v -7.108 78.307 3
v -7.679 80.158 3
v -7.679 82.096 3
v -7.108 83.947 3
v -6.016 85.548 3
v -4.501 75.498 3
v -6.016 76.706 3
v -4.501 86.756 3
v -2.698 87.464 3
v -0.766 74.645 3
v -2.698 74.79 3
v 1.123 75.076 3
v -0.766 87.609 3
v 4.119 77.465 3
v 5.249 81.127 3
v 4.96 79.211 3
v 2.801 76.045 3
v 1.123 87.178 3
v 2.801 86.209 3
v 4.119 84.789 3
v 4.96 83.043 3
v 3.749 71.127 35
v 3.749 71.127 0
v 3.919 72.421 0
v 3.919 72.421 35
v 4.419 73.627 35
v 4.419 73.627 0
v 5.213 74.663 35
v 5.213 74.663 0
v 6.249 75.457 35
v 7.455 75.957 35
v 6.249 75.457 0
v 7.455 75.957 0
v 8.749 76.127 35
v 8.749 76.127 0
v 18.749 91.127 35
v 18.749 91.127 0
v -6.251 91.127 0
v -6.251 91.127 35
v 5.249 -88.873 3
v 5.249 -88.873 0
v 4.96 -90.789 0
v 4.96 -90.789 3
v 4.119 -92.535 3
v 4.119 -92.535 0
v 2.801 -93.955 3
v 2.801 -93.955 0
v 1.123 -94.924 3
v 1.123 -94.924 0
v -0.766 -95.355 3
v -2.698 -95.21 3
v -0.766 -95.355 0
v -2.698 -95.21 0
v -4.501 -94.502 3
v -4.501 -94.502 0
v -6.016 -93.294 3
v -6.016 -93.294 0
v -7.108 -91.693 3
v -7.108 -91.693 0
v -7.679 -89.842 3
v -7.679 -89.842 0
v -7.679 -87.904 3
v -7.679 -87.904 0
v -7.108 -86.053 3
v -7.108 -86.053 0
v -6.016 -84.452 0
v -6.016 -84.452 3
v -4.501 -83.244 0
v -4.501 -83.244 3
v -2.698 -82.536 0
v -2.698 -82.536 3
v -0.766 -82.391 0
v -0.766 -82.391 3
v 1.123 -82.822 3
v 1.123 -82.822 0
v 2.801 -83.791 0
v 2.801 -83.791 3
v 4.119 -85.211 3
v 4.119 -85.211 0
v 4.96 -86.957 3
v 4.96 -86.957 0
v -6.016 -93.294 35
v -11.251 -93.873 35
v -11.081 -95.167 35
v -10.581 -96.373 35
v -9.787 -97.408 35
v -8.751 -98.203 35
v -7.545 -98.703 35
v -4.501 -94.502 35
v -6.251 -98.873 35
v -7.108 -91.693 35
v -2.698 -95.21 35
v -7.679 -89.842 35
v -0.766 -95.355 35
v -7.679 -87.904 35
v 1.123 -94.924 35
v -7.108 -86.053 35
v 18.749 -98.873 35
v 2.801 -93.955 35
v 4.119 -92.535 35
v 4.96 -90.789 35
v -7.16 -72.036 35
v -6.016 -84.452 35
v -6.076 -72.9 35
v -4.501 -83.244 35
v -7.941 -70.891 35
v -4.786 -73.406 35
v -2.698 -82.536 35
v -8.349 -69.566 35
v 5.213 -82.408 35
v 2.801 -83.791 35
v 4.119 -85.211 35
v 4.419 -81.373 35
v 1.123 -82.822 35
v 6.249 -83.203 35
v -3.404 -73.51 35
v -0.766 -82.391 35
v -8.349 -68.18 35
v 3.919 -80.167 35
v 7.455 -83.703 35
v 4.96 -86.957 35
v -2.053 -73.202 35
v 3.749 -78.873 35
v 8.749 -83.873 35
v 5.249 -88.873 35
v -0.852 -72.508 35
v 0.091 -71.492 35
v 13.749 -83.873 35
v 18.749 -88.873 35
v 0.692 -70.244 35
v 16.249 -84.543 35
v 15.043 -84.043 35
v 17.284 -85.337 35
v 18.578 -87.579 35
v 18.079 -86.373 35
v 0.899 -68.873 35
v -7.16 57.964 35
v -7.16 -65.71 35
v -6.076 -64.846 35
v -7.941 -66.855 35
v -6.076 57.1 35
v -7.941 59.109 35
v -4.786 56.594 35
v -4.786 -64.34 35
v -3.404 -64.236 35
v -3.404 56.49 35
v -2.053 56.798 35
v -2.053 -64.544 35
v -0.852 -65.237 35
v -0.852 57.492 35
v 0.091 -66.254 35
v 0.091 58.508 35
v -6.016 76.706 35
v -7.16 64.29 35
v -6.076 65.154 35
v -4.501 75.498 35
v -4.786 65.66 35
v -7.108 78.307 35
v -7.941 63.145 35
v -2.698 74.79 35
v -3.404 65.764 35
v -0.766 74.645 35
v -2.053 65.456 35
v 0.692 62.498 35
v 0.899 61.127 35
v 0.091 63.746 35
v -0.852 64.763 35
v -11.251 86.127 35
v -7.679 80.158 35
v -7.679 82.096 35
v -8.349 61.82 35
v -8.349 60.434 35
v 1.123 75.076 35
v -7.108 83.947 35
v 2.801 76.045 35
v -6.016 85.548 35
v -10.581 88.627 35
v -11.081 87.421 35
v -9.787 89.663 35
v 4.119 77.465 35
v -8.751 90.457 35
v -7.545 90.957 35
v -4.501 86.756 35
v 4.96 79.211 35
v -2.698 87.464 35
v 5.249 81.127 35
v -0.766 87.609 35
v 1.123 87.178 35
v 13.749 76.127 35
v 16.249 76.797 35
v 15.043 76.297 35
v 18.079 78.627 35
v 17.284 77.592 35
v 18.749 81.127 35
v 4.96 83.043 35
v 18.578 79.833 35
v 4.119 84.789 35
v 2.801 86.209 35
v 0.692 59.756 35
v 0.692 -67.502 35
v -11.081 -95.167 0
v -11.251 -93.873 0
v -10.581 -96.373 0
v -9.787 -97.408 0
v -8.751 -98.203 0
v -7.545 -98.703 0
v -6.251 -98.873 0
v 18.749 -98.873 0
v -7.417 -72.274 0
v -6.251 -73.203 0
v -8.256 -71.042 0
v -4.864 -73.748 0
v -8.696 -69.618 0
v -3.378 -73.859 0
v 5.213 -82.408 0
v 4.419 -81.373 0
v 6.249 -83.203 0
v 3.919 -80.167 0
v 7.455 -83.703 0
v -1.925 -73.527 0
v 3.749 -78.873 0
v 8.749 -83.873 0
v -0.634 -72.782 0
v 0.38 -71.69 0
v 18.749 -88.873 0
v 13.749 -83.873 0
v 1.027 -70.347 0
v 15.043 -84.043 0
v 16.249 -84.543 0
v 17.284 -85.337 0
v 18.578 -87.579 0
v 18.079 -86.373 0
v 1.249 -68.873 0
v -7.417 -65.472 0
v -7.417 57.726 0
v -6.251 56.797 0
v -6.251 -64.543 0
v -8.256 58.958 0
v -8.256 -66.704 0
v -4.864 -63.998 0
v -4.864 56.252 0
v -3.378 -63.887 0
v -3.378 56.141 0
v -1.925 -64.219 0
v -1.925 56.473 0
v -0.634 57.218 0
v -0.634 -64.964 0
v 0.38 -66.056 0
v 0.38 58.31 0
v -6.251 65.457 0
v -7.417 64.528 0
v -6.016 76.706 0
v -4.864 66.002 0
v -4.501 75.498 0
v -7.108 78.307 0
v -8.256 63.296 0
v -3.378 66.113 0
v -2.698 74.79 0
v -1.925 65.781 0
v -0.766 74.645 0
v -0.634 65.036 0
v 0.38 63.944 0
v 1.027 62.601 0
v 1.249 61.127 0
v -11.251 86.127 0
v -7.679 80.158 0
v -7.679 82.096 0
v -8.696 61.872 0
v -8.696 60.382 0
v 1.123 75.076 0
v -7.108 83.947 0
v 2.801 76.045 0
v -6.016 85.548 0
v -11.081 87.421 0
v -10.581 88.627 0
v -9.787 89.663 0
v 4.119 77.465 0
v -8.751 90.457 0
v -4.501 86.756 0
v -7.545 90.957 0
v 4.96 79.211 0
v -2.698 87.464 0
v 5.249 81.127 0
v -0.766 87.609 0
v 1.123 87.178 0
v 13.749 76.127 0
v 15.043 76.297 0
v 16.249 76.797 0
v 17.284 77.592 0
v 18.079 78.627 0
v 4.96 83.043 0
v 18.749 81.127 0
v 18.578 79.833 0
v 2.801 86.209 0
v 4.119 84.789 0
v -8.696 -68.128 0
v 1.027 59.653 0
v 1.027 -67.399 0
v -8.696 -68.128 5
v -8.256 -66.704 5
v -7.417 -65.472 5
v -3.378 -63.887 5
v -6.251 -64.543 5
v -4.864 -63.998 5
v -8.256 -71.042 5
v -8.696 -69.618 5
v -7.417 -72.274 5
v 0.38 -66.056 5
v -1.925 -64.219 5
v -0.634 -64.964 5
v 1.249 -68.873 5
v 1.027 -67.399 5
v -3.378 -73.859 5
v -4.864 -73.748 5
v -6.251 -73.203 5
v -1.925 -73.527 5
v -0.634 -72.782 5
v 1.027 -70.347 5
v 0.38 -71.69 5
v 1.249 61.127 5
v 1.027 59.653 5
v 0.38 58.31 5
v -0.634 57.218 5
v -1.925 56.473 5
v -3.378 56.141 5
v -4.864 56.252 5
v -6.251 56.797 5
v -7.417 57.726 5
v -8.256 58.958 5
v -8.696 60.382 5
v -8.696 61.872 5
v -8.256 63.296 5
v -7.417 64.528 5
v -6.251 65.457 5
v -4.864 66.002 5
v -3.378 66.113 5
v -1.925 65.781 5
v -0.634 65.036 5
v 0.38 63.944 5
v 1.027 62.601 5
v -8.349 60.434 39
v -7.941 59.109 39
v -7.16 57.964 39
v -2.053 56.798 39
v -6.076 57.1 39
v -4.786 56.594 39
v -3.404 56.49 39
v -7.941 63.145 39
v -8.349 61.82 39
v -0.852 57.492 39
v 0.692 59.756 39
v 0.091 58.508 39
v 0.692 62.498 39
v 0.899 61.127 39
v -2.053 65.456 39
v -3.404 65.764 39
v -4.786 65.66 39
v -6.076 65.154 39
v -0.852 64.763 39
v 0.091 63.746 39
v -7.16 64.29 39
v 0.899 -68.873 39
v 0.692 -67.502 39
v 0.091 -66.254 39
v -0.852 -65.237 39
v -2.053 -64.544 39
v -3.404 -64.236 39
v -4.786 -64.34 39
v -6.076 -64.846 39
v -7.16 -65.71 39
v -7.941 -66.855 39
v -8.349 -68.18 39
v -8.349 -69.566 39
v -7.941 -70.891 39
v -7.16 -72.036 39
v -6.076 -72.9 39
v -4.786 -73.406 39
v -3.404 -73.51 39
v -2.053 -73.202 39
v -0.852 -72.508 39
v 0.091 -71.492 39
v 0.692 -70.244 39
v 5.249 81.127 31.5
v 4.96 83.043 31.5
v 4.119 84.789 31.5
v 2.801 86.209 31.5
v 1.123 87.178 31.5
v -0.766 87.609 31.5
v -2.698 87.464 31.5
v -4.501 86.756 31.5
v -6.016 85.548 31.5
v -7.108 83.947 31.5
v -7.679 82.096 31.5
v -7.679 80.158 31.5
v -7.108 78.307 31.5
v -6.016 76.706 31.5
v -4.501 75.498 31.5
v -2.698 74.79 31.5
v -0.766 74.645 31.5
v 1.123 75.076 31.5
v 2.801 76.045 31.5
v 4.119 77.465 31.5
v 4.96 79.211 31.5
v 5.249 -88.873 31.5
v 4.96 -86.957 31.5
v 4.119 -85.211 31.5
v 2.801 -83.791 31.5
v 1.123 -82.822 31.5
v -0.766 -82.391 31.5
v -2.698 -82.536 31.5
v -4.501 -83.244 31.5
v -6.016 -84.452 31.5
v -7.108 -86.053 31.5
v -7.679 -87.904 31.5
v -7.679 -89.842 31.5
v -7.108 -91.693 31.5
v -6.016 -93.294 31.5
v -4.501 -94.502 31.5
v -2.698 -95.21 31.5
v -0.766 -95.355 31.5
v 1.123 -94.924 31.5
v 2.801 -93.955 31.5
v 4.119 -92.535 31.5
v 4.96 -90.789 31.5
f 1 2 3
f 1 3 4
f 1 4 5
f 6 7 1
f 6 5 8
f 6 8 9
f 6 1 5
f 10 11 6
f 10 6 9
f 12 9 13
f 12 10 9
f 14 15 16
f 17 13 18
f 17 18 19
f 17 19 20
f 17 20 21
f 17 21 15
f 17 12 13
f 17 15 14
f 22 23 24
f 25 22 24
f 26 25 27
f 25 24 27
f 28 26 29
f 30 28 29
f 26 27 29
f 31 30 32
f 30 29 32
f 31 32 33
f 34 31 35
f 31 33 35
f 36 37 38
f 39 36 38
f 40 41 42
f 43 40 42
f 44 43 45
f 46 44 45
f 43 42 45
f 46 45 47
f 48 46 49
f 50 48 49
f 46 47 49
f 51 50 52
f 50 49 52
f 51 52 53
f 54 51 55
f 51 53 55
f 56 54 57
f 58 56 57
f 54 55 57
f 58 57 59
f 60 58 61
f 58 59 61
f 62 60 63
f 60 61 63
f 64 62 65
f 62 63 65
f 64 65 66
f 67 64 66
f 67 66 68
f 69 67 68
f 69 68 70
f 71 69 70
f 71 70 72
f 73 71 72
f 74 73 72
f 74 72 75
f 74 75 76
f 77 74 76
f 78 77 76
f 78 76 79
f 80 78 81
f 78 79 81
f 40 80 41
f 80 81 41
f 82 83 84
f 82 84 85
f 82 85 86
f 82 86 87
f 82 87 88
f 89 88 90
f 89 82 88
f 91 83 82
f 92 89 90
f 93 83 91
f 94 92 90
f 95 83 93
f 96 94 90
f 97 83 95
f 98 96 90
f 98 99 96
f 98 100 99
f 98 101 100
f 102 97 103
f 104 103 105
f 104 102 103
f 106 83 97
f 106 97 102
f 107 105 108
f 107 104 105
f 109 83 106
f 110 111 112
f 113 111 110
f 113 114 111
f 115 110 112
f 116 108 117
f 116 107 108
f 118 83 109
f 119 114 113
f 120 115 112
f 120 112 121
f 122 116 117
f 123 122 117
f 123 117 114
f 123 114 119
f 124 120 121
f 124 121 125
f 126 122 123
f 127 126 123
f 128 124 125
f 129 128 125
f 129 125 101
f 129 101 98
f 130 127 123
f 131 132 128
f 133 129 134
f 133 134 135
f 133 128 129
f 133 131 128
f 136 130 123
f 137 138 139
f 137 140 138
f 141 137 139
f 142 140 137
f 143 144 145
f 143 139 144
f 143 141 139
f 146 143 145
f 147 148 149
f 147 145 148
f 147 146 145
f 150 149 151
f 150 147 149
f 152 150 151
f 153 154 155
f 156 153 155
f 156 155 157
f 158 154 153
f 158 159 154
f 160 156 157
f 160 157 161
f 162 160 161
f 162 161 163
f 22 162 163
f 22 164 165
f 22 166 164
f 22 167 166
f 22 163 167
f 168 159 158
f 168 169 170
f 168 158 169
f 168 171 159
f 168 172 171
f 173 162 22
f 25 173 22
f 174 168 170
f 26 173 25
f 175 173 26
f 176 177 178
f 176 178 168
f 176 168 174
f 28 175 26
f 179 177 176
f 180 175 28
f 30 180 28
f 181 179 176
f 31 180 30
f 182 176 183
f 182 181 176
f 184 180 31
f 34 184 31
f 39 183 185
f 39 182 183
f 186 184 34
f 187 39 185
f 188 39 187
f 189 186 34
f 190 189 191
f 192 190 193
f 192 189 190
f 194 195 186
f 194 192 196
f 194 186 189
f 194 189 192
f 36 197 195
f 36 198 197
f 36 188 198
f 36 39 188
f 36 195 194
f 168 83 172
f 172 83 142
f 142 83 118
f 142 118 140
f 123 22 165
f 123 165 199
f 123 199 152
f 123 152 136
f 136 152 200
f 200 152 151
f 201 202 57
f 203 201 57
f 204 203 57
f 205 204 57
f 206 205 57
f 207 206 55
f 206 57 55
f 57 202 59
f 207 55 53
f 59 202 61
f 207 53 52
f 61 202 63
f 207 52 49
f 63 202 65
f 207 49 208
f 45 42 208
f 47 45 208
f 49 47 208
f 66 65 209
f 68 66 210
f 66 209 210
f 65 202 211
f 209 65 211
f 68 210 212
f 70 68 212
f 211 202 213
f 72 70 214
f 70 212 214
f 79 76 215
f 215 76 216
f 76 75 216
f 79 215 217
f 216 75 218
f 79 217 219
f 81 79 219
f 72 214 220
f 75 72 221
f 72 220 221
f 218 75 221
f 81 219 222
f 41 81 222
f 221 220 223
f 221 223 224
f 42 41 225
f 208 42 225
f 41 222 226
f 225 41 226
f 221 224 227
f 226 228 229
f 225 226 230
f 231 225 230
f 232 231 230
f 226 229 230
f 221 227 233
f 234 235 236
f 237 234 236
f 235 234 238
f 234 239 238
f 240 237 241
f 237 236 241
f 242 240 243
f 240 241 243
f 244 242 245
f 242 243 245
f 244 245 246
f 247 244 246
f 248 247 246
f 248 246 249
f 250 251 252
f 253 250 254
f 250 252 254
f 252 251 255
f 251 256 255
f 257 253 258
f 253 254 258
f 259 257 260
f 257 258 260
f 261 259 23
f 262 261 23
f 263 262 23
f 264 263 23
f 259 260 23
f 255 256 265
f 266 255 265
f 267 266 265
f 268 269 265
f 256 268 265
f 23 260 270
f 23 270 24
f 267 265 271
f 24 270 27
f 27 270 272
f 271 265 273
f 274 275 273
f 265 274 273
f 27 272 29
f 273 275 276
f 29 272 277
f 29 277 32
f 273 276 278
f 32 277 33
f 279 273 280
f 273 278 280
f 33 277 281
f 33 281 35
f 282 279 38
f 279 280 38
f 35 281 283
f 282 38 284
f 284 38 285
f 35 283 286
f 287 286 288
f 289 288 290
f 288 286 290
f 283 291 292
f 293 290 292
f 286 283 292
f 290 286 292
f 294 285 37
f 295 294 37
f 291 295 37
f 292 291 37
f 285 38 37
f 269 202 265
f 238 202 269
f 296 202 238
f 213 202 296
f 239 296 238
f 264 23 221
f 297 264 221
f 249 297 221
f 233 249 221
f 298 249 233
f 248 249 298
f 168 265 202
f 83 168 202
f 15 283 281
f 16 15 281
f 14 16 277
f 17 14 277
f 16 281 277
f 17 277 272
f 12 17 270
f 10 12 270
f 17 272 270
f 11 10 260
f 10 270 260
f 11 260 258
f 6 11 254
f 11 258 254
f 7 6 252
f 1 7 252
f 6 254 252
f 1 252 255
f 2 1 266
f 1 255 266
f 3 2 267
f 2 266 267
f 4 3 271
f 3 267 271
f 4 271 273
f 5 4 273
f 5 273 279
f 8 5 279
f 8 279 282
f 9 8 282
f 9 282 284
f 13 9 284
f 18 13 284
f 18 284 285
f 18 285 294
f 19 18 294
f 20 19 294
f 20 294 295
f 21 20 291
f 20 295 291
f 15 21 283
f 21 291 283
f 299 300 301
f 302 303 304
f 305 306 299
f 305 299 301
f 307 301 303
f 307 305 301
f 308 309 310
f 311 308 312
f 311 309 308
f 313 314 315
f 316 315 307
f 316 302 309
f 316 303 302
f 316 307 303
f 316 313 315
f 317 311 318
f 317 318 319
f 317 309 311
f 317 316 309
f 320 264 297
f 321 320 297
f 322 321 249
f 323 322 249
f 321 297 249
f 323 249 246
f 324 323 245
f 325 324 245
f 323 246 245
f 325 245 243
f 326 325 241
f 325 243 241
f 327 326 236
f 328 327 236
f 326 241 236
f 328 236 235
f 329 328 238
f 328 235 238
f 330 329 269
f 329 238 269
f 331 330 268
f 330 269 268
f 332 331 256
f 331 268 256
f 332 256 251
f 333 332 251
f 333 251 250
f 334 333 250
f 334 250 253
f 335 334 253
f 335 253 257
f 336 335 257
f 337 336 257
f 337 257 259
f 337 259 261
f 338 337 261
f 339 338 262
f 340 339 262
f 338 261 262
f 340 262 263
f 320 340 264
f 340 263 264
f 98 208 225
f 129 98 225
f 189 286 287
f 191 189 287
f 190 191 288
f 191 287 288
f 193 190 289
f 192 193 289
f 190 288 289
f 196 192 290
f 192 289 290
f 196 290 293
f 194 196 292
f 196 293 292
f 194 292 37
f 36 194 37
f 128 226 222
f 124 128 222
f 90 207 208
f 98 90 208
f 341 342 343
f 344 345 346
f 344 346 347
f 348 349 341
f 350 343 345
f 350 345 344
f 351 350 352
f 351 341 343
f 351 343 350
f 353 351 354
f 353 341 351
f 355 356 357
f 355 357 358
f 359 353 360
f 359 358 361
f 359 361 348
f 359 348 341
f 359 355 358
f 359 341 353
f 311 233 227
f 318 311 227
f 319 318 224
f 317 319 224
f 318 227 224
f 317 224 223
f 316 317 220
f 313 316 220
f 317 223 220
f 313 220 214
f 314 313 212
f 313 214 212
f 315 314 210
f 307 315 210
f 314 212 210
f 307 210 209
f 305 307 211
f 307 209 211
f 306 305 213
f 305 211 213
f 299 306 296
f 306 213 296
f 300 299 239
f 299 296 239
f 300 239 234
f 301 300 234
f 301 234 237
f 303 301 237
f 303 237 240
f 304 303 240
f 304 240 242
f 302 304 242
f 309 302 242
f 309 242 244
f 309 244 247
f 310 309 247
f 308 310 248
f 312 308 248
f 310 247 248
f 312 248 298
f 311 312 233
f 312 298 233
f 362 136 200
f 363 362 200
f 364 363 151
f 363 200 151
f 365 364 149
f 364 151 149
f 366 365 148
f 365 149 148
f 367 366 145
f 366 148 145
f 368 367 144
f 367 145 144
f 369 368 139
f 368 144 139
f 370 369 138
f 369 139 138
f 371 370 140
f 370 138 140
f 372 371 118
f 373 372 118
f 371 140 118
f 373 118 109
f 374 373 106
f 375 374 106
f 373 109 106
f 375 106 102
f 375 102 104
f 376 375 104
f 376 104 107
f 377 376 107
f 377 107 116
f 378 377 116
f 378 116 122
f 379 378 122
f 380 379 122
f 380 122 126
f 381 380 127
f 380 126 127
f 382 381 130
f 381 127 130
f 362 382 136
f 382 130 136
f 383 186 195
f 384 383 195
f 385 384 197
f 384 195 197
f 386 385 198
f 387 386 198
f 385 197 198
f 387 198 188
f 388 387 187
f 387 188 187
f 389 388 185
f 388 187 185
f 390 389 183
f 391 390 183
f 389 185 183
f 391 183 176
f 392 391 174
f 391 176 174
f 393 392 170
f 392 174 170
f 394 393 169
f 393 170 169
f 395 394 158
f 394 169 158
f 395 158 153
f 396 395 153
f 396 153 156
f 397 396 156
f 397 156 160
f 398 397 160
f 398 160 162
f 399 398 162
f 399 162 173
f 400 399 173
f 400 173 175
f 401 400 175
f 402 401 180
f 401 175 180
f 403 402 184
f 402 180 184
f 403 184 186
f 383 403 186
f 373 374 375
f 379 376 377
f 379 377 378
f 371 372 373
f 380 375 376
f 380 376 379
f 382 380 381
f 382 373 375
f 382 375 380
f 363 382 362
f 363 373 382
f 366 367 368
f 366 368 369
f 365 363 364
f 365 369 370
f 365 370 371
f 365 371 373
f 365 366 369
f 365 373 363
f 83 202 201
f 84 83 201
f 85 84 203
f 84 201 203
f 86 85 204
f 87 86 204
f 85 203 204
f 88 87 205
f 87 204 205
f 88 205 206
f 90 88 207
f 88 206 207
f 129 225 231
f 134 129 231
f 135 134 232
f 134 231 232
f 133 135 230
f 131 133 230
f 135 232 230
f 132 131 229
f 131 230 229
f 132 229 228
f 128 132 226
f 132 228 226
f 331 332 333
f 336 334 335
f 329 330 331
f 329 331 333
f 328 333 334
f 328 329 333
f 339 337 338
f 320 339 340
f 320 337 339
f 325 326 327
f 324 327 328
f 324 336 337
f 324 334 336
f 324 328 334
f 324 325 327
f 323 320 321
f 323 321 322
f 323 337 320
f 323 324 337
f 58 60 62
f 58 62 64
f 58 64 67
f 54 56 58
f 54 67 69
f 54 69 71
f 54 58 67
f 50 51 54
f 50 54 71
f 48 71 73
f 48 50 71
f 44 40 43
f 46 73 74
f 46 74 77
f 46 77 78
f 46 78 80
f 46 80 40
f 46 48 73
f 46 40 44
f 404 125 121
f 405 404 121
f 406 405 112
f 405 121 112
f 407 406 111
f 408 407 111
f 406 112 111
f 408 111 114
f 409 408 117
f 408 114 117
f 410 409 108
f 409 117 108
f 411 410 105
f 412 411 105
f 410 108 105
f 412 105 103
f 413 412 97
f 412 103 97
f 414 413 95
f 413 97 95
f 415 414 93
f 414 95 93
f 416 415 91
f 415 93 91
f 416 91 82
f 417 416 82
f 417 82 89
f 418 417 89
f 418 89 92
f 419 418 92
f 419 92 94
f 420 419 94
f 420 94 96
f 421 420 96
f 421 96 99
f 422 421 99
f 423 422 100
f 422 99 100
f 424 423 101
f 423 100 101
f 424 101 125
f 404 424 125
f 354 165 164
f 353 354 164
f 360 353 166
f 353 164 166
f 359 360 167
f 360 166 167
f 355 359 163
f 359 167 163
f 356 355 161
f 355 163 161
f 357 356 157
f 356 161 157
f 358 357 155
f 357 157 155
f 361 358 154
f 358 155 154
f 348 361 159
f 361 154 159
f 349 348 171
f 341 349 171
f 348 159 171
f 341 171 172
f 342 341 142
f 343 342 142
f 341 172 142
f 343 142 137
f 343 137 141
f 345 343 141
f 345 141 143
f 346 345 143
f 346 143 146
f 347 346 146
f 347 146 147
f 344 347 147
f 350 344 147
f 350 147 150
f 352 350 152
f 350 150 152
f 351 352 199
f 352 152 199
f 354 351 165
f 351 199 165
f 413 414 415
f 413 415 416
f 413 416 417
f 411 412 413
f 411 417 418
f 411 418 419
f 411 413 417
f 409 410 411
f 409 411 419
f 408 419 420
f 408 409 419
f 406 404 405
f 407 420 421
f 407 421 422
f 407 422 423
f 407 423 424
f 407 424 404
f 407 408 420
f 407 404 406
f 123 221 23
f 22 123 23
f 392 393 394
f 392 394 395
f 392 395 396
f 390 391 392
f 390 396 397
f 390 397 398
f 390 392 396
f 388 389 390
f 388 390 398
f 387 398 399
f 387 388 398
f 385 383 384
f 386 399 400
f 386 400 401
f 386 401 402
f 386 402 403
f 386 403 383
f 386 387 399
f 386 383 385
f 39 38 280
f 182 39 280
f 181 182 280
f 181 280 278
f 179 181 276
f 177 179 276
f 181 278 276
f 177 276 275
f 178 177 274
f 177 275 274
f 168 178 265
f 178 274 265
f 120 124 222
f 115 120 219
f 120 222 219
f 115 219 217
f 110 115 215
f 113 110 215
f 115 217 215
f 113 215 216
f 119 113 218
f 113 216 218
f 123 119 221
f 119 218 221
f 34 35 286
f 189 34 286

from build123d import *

# Parameters (mm, degrees)
F1_DEPTH = 35
F2_R     = 6.5
F4_DEPTH = 3.5
F2_R_2   = 4.65
F5_DEPTH = 4
F3_R     = 6.5
F6_DEPTH = 3
F3_R_2   = 5
F7_DEPTH = 5


with BuildPart() as f1:
    # F0 (on Top) → F1 (new body)
    with BuildSketch(Plane.XY):
        with BuildLine():
            Line((18.748637, 81.127049), (18.748637, 91.127049))
            Line((18.748637, 91.127049), (-6.251363, 91.127049))
            ThreePointArc((-6.251363, 91.127049), (-9.786897, 89.662583), (-11.251363, 86.127049))
            Line((-11.251363, 86.127049), (-11.251363, -93.872951))
            ThreePointArc((-11.251363, -93.872951), (-9.786897, -97.408485), (-6.251363, -98.872951))
            Line((-6.251363, -98.872951), (18.748637, -98.872951))
            Line((18.748637, -98.872951), (18.748637, -88.872951))
            ThreePointArc((18.748637, -88.872951), (17.284171, -85.337417), (13.748637, -83.872951))
            Line((13.748637, -83.872951), (8.748637, -83.872951))
            ThreePointArc((8.748637, -83.872951), (5.213103, -82.408485), (3.748637, -78.872951))
            Line((3.748637, -78.872951), (3.748637, 71.127049))
            ThreePointArc((3.748637, 71.127049), (5.213103, 74.662583), (8.748637, 76.127049))
            Line((8.748637, 76.127049), (13.748637, 76.127049))
            ThreePointArc((13.748637, 76.127049), (17.284171, 77.591515), (18.748637, 81.127049))
        make_face()
    extrude(amount=F1_DEPTH)

    # F2 (on face) → F4 (cut)
    with BuildSketch(Plane.XY.offset(35)):
        with Locations((-1.251363, 81.127049)):
            Circle(F2_R)
        with Locations((-1.251363, -88.872951)):
            Circle(F2_R)
    extrude(amount=-F4_DEPTH, mode=Mode.SUBTRACT)

    # F2 (on face) → F5 (join)
    with BuildSketch(Plane.XY.offset(35)):
        with Locations((-3.751363, 61.127049)):
            Circle(F2_R_2)
        with Locations((-3.751363, -68.872951)):
            Circle(F2_R_2)
    extrude(amount=F5_DEPTH)

    # F3 (on face) → F6 (cut)
    with BuildSketch(Plane(origin=(0, 0, 0), x_dir=(1, 0, 0), z_dir=(0, 0, -1))):
        with Locations((-1.251363, -81.127049)):
            Circle(F3_R)
        with Locations((-1.251363, 88.872951)):
            Circle(F3_R)
    extrude(amount=-F6_DEPTH, mode=Mode.SUBTRACT)

    # F3 (on face) → F7 (cut)
    with BuildSketch(Plane(origin=(0, 0, 0), x_dir=(1, 0, 0), z_dir=(0, 0, -1))):
        with Locations((-3.751363, -61.127049)):
            Circle(F3_R_2)
        with Locations((-3.751363, 68.872951)):
            Circle(F3_R_2)
    extrude(amount=-F7_DEPTH, mode=Mode.SUBTRACT)


solid = f1.part
